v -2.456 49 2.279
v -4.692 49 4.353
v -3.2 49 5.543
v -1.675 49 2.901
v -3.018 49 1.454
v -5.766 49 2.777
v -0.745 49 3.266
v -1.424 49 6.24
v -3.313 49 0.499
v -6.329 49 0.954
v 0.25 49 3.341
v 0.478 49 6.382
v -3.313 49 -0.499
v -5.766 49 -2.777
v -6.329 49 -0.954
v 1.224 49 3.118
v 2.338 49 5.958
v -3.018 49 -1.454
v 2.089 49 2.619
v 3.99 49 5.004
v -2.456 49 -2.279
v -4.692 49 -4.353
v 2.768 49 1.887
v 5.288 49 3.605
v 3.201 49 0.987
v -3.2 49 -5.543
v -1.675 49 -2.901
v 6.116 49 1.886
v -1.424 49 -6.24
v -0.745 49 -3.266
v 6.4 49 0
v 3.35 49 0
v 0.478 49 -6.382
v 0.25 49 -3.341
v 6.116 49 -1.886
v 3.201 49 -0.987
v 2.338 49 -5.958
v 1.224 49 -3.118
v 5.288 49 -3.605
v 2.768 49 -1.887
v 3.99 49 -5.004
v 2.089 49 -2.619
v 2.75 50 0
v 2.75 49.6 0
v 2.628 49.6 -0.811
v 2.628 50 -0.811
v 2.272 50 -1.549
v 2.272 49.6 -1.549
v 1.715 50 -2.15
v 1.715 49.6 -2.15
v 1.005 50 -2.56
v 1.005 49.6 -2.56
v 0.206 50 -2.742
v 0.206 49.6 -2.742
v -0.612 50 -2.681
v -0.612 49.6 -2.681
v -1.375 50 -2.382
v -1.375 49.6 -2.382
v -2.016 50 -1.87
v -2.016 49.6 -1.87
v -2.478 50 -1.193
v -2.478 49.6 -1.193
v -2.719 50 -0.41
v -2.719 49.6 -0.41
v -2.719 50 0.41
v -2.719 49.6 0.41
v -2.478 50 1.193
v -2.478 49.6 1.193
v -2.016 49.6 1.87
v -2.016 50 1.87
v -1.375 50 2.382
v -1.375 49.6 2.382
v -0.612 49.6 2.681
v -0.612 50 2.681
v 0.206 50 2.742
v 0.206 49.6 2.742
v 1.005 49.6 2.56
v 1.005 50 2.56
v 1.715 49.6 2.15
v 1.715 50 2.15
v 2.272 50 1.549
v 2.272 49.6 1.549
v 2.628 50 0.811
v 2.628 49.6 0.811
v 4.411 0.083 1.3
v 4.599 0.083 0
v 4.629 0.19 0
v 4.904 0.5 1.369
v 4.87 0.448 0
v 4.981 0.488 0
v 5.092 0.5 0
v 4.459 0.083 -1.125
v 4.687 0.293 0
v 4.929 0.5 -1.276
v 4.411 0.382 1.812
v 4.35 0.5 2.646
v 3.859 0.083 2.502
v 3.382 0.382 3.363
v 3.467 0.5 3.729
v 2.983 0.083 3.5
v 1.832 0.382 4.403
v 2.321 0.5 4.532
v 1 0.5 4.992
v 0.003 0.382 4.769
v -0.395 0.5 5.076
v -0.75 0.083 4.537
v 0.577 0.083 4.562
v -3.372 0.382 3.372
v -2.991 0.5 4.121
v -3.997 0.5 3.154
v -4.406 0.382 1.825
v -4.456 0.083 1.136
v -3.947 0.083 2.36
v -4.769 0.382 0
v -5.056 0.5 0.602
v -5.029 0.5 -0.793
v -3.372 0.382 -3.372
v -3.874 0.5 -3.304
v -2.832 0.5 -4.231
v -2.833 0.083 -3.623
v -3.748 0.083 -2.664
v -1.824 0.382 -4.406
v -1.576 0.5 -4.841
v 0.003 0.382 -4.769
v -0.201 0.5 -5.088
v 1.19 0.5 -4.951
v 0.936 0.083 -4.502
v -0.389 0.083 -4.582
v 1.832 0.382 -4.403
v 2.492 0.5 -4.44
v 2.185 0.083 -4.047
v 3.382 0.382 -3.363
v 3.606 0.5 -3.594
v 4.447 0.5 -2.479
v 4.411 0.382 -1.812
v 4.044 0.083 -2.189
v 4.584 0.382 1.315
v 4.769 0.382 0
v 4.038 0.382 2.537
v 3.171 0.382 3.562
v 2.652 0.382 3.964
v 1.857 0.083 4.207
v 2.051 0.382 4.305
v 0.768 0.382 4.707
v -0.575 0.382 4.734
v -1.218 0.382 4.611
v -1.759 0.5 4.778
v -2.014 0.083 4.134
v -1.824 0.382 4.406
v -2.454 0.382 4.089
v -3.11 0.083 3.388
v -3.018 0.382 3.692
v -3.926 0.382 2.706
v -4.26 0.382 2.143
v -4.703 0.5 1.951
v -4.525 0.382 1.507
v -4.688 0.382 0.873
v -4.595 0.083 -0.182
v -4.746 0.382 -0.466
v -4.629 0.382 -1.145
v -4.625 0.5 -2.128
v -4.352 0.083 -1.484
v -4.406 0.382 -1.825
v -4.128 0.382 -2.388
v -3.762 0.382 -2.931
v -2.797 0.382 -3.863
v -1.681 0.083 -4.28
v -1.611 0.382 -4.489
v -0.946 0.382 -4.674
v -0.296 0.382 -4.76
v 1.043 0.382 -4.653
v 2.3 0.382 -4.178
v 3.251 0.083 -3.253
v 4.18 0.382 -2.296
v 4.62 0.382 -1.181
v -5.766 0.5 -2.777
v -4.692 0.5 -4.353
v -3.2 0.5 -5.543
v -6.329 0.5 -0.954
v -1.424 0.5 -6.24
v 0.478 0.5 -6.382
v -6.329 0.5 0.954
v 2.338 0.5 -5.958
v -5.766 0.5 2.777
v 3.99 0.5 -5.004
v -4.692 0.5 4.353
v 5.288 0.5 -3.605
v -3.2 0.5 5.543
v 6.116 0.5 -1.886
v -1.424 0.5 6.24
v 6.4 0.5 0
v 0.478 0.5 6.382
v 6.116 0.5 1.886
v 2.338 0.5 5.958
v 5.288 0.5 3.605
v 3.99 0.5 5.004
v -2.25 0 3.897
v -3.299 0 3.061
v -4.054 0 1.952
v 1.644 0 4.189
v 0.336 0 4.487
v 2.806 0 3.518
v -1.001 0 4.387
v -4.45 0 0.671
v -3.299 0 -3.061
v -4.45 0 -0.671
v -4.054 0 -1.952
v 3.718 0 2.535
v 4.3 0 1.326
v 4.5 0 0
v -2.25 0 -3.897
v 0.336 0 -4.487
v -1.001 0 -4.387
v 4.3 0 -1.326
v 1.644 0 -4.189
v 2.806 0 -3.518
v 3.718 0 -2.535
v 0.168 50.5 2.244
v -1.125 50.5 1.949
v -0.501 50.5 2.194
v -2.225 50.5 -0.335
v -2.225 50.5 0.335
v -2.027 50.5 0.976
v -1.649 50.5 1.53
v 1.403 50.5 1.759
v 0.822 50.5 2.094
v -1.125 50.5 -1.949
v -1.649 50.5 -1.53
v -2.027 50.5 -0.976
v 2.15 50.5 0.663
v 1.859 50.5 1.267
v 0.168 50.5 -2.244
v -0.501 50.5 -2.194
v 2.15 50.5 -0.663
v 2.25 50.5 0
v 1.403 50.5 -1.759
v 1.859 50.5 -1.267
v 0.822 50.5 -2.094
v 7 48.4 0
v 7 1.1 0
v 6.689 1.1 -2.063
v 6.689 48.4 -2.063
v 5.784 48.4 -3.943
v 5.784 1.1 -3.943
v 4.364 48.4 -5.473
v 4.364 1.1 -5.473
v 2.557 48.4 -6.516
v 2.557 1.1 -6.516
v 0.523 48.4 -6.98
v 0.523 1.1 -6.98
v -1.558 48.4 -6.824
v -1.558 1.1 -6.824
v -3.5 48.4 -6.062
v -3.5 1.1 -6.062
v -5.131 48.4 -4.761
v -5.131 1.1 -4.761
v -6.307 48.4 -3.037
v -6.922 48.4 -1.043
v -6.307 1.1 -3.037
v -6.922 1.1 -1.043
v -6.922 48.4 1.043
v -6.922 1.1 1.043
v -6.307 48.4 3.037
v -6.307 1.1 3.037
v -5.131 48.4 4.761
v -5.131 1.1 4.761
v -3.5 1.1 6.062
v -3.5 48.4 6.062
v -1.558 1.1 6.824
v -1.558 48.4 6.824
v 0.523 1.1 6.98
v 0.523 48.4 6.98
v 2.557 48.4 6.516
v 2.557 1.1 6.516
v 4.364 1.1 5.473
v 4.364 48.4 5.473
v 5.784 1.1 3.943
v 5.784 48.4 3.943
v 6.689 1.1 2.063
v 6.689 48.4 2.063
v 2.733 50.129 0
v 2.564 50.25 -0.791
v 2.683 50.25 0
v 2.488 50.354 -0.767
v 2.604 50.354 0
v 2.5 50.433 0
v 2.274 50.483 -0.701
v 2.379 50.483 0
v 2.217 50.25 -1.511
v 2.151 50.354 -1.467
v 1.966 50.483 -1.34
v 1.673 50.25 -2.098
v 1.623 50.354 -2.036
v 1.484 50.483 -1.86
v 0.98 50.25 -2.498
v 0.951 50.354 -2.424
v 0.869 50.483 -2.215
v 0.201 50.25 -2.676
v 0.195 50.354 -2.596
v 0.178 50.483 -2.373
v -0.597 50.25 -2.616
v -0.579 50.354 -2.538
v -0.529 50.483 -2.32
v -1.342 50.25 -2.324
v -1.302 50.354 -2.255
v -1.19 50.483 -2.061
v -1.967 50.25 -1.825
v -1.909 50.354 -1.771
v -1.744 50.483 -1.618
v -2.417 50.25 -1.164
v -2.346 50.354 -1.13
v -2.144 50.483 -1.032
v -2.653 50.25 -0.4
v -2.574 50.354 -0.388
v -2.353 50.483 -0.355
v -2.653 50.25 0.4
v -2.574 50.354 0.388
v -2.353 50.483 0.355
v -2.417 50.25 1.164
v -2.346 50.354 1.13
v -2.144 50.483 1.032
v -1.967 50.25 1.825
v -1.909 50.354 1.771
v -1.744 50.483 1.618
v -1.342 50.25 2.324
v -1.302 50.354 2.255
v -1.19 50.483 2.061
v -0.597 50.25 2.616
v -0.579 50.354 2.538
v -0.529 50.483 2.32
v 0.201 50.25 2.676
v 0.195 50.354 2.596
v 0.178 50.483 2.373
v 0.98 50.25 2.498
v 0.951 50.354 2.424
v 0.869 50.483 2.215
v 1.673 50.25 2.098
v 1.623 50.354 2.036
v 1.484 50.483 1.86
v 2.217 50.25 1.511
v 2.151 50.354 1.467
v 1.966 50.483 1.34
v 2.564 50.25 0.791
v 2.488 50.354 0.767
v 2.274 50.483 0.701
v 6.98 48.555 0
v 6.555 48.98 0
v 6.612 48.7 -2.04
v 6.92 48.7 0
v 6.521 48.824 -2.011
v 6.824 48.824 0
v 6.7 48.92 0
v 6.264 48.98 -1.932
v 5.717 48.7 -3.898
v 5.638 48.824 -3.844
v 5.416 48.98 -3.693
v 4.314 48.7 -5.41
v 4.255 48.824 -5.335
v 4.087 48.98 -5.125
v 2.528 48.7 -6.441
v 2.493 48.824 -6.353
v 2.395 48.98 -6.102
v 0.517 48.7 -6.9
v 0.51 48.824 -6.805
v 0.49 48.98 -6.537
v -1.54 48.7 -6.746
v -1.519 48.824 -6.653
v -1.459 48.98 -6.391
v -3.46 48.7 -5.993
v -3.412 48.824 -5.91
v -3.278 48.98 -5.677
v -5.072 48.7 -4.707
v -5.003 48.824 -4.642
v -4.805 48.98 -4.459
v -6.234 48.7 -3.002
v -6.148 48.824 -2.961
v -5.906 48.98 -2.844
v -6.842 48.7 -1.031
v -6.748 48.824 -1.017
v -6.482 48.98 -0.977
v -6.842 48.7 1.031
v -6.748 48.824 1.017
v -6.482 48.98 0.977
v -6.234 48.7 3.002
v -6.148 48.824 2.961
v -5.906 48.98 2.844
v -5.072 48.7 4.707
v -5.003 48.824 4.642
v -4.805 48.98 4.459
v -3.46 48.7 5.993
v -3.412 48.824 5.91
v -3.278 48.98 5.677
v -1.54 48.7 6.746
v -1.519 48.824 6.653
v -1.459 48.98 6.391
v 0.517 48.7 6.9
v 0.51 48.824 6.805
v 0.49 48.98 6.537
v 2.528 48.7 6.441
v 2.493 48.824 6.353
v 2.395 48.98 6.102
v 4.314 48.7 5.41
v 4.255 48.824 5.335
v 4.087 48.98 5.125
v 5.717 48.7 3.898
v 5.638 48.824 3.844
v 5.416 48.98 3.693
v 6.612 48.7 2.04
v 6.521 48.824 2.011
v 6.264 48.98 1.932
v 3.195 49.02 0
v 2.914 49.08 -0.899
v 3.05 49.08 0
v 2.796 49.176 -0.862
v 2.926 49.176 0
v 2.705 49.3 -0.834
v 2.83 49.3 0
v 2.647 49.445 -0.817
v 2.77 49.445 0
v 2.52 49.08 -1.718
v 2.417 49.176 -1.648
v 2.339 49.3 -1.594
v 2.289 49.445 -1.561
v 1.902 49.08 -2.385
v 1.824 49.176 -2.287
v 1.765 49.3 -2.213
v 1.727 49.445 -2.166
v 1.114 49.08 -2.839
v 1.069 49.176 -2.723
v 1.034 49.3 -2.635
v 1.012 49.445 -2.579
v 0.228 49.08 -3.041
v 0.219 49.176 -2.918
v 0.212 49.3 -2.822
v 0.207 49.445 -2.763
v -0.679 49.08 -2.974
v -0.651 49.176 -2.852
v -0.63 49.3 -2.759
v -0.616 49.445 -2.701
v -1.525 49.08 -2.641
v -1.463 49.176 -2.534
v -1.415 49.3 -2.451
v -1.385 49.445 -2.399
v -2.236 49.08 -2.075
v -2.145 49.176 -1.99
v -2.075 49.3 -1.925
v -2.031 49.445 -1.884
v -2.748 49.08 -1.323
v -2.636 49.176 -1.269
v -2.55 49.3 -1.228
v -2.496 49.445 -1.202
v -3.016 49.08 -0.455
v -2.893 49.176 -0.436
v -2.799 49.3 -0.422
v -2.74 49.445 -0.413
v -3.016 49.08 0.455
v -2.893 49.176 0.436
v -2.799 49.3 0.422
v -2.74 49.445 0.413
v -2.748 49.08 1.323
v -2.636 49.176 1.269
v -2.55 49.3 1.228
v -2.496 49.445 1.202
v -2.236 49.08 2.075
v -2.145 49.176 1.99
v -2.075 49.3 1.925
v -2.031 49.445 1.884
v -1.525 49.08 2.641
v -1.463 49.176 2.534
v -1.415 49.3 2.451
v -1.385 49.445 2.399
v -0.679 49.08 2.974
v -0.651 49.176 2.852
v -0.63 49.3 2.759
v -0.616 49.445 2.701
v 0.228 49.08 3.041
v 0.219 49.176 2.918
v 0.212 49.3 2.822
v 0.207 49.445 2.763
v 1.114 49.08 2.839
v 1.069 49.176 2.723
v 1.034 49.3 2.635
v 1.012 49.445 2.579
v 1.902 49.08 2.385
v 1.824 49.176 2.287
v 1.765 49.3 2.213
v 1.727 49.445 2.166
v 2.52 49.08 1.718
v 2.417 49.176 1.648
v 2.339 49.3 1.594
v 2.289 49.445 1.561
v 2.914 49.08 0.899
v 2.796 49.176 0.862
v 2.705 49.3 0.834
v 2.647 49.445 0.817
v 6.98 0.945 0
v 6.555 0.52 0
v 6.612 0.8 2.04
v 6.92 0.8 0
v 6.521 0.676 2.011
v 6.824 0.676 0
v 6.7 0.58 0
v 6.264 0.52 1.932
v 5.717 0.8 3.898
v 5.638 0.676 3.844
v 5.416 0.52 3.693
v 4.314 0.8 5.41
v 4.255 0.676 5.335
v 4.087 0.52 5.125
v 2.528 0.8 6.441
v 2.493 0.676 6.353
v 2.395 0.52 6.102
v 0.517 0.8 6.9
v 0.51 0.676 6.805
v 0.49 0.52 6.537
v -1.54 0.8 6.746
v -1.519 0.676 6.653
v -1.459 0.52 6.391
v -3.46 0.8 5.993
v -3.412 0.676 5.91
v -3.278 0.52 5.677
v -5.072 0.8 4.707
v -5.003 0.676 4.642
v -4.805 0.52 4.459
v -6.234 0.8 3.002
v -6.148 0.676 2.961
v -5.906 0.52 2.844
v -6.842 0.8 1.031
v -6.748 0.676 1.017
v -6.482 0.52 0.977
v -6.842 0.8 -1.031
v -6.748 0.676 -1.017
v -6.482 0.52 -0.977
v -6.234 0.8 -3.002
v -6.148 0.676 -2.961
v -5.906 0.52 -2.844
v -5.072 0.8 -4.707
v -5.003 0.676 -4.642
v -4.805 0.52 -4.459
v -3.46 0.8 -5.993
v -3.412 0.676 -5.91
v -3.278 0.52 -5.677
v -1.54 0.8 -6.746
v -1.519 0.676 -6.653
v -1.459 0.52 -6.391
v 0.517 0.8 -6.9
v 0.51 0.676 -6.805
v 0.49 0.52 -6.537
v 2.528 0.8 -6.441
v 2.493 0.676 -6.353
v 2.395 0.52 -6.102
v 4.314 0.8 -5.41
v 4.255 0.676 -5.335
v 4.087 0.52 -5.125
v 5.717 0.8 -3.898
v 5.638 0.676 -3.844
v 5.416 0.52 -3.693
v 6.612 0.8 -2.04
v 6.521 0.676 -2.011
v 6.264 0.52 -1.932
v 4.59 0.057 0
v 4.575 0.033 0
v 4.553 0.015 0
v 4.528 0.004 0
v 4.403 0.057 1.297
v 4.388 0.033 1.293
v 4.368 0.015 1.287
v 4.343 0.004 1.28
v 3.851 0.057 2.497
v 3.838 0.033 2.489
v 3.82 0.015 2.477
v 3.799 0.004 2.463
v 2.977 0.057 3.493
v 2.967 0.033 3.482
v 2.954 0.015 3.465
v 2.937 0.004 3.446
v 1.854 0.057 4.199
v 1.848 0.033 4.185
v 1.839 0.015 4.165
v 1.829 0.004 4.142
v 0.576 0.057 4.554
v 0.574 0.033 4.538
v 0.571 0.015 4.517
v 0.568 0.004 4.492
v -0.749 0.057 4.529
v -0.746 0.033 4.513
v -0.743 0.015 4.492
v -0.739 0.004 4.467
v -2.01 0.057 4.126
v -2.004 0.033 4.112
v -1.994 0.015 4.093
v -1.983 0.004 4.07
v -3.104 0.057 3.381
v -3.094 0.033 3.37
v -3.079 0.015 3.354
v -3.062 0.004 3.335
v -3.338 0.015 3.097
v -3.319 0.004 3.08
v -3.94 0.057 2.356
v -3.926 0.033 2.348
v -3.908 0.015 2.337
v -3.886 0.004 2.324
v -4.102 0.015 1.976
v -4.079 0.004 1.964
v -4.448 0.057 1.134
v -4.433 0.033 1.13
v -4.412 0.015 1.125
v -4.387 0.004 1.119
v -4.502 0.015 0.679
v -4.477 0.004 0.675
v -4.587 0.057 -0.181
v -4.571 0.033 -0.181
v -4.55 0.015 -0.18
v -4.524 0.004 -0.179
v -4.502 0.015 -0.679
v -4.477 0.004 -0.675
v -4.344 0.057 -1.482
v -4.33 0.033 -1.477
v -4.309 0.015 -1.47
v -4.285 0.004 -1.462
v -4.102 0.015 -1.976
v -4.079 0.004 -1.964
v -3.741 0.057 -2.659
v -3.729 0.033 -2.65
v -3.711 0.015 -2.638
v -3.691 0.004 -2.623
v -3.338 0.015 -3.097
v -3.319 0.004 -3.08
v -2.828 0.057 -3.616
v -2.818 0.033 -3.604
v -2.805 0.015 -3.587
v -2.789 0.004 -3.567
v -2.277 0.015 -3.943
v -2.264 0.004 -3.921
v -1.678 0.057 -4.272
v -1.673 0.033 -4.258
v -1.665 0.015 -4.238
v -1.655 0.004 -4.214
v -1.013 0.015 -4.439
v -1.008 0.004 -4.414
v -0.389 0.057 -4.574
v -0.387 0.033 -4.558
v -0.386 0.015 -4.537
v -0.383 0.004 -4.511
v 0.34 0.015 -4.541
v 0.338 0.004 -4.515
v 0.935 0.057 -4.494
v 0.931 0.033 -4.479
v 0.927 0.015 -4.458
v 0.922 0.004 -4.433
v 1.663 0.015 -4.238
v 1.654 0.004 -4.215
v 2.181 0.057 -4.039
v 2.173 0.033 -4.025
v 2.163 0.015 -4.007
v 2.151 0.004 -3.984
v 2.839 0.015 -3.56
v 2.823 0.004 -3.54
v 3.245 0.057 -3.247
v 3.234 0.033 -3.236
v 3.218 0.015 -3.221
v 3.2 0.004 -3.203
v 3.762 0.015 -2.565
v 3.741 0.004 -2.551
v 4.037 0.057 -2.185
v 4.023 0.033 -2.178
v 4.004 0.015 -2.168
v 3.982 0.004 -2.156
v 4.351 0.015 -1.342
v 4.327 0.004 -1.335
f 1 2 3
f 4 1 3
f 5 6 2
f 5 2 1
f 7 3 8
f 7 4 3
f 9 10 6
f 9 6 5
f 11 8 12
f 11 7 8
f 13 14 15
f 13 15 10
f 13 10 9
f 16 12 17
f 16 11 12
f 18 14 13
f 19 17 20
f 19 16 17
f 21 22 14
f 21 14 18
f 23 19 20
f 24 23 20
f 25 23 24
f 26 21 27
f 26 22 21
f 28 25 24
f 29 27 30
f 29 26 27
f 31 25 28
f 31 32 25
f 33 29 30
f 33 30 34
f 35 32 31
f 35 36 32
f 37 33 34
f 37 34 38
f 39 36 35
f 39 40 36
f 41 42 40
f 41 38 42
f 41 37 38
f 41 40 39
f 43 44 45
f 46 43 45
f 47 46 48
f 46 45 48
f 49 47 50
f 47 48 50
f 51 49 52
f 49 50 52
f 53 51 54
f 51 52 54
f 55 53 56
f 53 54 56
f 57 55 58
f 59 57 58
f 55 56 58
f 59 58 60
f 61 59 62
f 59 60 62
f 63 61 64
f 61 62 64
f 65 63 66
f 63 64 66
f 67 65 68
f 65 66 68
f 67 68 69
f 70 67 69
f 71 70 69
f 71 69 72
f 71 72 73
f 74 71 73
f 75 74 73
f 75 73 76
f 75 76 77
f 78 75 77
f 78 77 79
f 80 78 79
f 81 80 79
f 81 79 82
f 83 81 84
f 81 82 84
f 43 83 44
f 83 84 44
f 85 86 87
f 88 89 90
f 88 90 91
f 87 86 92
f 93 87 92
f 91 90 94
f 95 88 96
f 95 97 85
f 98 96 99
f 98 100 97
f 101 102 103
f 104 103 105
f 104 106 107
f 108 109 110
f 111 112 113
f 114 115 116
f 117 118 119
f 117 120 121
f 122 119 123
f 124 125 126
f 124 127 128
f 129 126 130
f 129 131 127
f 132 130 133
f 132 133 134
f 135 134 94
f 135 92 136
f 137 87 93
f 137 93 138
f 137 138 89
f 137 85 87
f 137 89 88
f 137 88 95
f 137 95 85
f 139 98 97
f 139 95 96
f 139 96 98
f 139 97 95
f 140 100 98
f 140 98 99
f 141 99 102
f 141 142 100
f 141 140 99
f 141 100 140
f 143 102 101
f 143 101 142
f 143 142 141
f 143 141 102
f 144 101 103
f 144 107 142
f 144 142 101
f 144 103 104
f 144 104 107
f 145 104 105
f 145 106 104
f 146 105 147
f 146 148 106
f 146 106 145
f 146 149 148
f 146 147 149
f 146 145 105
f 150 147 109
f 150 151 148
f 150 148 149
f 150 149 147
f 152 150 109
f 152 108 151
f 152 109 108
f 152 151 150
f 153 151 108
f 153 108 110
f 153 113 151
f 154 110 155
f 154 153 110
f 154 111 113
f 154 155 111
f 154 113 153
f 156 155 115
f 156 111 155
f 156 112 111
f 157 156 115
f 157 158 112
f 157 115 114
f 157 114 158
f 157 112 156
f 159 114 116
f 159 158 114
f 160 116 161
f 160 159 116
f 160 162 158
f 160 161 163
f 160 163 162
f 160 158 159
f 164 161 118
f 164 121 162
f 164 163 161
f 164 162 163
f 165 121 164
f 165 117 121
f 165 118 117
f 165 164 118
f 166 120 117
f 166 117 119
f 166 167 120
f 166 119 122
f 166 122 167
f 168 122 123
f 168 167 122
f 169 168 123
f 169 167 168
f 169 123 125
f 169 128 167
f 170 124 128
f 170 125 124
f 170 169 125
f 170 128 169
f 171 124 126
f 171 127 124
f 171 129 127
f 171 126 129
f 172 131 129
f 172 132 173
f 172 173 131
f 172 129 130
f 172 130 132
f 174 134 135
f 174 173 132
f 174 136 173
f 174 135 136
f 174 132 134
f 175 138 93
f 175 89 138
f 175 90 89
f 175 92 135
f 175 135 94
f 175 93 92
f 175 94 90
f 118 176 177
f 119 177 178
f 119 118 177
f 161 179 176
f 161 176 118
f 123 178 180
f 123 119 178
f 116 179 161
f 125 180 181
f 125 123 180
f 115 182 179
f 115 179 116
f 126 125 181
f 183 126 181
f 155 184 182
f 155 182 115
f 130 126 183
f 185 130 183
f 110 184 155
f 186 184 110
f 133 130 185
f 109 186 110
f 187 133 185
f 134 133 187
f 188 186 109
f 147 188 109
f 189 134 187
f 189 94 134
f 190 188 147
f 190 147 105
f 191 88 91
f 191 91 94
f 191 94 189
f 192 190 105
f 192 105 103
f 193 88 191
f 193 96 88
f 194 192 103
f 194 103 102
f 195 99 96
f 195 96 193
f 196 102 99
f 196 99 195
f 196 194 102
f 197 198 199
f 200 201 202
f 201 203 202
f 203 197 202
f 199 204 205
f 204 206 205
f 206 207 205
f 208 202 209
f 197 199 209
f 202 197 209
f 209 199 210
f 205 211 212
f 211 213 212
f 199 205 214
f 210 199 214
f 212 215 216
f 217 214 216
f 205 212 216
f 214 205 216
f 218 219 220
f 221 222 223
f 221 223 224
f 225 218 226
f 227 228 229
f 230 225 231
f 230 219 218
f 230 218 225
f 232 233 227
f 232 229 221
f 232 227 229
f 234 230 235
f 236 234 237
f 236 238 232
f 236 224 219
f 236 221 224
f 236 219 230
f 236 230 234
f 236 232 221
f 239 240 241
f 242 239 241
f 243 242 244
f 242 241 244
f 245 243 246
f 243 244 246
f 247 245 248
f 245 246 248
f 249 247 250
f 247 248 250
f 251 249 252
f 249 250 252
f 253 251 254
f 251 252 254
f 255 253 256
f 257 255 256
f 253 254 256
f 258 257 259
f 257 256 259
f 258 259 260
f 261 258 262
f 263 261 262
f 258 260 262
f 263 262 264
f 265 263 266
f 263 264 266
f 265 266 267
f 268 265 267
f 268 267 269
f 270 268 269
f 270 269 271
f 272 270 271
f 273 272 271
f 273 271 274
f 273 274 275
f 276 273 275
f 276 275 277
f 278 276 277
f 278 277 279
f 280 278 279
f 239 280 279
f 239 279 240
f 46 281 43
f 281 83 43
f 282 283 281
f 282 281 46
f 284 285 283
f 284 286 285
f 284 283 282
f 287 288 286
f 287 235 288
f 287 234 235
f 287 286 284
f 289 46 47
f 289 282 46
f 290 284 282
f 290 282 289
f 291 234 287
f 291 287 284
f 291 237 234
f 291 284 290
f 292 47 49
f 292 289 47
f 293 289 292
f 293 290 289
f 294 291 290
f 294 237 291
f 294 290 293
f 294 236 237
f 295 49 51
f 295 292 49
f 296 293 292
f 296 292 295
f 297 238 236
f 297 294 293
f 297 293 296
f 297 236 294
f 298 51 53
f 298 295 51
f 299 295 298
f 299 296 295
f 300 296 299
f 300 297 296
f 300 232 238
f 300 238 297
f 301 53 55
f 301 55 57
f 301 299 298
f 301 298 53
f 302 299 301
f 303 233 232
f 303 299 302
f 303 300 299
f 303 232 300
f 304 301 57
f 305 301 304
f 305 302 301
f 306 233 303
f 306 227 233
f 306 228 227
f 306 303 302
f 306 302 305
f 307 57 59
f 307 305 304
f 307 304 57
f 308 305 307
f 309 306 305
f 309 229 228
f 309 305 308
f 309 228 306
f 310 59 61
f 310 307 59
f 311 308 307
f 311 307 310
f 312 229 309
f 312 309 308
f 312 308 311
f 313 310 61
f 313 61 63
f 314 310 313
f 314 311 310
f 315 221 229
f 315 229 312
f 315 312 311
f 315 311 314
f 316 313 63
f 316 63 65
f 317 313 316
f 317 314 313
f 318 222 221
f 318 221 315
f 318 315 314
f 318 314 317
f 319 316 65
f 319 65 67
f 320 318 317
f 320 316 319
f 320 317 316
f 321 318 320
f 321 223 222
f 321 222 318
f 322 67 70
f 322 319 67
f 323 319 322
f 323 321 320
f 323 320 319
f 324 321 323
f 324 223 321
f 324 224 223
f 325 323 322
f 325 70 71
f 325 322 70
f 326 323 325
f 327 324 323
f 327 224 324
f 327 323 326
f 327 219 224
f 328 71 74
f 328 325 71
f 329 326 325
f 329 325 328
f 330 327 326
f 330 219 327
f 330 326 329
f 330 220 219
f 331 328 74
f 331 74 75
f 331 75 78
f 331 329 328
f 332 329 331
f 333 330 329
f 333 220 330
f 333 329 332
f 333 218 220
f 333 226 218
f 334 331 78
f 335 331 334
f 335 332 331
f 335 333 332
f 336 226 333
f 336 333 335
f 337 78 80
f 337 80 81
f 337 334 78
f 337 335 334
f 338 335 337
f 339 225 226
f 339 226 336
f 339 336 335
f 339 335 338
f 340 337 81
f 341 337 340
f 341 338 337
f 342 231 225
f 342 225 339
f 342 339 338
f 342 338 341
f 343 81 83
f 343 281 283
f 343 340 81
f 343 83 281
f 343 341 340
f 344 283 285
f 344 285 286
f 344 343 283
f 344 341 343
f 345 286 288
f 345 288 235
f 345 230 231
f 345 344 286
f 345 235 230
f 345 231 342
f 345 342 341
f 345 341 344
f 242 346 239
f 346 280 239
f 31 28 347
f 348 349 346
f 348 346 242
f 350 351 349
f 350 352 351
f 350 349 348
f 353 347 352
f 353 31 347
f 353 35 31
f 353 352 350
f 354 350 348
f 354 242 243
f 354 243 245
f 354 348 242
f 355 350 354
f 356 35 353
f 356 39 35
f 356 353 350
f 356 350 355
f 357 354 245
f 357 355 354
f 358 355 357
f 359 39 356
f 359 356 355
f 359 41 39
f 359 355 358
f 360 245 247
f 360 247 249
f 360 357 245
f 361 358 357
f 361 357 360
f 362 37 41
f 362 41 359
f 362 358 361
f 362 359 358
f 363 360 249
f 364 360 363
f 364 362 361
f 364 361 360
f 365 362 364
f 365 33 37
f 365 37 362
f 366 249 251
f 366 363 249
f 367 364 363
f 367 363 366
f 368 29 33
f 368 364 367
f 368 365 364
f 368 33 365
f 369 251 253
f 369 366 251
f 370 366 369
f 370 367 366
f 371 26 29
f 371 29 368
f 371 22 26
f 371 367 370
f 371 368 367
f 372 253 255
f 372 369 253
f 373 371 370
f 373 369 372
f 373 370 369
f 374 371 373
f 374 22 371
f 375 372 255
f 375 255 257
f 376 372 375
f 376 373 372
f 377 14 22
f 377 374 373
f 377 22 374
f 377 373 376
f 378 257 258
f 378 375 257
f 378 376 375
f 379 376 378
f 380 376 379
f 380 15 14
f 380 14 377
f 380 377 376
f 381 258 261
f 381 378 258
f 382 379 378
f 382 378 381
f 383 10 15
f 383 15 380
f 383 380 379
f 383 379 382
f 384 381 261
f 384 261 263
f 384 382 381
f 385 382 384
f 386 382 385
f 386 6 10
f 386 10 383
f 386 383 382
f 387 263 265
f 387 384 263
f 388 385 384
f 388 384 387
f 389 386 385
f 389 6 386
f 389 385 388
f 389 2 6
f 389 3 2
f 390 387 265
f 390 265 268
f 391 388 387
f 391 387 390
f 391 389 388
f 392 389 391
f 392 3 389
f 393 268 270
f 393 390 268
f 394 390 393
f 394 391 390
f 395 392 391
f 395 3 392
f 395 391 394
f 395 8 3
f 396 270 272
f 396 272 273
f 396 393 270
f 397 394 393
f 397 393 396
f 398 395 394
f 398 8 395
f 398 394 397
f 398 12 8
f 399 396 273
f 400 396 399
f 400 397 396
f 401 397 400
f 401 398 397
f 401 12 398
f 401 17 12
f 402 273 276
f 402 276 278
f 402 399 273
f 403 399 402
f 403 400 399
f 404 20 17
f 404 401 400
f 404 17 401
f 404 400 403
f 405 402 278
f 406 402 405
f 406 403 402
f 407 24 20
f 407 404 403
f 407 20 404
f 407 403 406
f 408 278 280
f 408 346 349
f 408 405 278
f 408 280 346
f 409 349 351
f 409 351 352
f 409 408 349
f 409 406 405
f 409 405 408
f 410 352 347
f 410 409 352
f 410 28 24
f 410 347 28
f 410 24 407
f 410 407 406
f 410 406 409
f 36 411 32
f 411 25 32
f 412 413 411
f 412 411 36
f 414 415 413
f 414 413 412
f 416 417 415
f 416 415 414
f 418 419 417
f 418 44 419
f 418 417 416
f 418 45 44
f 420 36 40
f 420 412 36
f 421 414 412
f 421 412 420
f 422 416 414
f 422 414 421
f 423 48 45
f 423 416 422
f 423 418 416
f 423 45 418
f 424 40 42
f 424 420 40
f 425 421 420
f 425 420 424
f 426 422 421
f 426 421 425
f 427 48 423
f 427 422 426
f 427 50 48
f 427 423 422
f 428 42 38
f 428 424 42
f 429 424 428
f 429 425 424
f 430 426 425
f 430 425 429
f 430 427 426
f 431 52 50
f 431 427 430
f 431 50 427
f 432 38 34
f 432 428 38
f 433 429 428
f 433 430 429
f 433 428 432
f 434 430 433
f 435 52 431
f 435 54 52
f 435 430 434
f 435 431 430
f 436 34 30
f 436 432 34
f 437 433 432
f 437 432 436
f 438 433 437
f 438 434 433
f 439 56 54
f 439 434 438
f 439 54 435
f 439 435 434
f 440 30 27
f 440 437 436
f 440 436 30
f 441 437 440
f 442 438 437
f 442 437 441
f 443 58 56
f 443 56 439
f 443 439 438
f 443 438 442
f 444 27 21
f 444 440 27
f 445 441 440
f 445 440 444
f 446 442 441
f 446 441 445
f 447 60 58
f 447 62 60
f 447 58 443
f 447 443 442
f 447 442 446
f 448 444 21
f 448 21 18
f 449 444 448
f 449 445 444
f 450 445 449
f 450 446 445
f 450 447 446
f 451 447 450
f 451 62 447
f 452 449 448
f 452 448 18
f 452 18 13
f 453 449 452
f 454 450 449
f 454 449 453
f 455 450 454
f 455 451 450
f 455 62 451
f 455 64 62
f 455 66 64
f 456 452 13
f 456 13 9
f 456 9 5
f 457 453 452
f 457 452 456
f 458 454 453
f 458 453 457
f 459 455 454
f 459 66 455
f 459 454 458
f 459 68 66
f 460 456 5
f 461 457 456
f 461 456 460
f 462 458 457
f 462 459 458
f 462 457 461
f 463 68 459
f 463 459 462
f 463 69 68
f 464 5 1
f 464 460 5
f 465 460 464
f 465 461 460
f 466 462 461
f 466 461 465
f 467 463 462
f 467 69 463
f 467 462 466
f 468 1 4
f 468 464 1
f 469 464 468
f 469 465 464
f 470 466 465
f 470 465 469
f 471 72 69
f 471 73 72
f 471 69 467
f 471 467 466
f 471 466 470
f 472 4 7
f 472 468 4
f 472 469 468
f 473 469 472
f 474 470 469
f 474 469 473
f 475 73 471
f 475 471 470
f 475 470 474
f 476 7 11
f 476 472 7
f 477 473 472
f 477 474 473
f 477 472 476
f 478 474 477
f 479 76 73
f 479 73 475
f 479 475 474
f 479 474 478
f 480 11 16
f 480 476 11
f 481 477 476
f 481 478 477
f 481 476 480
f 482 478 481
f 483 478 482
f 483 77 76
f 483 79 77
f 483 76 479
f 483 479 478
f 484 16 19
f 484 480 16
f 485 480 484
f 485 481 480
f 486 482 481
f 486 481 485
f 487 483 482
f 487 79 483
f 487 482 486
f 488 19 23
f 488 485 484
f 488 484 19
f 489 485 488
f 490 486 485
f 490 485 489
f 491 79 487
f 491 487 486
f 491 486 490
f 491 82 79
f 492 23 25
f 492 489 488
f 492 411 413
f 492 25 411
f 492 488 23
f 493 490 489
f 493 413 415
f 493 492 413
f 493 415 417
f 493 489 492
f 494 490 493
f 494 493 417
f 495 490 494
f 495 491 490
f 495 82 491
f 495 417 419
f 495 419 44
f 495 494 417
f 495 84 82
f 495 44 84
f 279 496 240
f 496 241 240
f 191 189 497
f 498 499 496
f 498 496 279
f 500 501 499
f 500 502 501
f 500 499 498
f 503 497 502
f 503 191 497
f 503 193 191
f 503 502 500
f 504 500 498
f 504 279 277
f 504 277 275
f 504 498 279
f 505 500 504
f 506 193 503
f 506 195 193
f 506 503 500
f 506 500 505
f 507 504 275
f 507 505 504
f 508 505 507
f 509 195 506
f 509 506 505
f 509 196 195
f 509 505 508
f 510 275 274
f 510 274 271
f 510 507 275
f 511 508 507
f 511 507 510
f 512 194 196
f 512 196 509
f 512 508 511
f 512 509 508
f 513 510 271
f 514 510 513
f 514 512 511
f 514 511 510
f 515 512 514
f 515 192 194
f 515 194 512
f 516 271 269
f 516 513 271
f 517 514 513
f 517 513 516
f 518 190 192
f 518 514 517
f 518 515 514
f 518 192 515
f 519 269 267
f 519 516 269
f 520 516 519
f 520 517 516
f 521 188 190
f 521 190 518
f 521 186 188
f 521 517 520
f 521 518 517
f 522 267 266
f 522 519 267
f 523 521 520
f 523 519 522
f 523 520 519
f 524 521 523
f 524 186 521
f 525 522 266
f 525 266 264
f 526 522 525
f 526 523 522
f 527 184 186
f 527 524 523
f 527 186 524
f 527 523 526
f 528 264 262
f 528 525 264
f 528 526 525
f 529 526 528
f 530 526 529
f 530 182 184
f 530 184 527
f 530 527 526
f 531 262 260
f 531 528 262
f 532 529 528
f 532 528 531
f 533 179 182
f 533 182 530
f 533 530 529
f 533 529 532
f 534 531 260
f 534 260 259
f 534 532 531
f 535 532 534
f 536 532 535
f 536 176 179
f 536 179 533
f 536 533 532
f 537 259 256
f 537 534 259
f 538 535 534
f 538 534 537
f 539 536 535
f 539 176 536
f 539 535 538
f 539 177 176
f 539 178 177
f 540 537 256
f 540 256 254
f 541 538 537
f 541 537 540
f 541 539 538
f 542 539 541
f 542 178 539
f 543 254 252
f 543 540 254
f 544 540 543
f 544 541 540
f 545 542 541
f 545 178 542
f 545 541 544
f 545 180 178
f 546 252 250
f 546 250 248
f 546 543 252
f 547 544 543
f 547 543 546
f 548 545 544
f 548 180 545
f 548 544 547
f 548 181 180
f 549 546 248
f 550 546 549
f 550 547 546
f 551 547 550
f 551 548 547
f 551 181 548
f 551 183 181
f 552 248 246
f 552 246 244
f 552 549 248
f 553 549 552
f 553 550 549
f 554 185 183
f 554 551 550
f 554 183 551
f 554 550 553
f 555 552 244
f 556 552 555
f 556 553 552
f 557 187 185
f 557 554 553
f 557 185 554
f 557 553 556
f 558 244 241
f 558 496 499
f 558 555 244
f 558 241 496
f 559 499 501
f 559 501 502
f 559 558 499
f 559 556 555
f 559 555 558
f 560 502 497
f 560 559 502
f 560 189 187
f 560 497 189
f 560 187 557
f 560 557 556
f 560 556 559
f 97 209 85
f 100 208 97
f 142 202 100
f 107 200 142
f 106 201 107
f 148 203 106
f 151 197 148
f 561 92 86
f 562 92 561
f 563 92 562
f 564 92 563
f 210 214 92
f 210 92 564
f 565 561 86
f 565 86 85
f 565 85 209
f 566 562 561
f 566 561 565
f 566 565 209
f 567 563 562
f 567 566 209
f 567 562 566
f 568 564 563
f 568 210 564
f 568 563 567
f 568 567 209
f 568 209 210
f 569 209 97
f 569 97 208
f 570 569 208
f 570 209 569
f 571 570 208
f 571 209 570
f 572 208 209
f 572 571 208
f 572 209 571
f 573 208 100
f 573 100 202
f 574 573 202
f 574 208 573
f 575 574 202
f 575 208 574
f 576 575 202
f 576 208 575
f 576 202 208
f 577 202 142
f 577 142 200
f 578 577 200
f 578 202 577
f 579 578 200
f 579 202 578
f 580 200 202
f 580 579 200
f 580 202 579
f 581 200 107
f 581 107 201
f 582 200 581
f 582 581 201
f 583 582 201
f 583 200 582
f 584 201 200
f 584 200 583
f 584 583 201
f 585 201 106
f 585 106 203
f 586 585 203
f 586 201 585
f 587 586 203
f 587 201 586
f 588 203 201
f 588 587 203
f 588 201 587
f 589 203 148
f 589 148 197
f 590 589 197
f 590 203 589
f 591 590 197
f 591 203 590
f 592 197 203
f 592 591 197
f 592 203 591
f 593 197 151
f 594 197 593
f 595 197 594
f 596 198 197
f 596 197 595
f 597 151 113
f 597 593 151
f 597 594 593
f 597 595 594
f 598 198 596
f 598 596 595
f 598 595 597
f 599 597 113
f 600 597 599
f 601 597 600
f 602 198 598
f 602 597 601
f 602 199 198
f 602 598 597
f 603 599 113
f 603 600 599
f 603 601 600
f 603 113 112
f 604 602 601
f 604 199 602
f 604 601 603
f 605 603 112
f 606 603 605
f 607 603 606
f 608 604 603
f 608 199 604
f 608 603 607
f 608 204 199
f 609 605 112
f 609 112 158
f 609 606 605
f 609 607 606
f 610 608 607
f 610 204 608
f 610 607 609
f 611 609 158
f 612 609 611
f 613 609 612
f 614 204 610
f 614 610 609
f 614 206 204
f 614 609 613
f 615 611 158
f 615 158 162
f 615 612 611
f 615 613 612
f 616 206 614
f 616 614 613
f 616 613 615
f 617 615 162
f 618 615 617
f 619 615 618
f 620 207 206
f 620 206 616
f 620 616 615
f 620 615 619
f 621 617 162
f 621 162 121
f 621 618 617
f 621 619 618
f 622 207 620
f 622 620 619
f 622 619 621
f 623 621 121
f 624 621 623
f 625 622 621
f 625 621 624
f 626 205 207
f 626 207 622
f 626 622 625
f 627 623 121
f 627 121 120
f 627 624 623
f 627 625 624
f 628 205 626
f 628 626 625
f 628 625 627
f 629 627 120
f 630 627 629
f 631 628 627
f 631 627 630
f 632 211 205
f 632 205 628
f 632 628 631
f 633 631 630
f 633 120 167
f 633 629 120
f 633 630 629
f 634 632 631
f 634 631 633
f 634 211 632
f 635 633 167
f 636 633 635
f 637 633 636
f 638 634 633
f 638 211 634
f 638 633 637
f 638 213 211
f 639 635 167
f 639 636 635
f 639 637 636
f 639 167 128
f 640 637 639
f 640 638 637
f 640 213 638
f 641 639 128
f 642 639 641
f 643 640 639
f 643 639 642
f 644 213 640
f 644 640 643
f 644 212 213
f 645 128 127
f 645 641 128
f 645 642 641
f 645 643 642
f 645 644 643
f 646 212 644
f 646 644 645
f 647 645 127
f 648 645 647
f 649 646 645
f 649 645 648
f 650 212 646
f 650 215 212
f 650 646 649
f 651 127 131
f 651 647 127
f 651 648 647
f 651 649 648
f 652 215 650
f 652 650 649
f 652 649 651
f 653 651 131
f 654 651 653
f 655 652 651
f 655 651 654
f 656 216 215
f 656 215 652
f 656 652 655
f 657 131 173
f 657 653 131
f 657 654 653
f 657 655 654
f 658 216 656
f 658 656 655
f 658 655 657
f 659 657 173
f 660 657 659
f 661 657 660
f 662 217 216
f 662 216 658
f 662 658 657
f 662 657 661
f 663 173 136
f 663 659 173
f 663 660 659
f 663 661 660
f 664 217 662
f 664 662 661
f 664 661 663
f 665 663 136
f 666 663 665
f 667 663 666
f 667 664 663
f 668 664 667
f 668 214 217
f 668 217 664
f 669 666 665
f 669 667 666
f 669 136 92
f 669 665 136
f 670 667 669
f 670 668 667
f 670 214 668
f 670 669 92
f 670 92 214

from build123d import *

# Parameters (mm, degrees)
SKETCH1_R           = 7
BOSS_EXTRUDE1_DEPTH = 49
SKETCH2_R           = 2.75
BOSS_EXTRUDE2_DEPTH = 1.5
FILLET2_R           = 0.6
FILLET3_R           = 0.5
SKETCH4_R           = 7
SKETCH4_R_2         = 4.6
CUT_EXTRUDE2_DEPTH  = 0.5
FILLET7_R           = 0.6
FILLET8_R           = 0.6
FILLET9_R           = 0.1
FILLET10_R          = 0.5


with BuildPart() as part:
    # Sketch1 → Boss-Extrude1 (new body)
    with BuildSketch(Plane(origin=(0, 0, 0), x_dir=(1, 0, 0), z_dir=(0, 1, 0))):
        Circle(SKETCH1_R)
    extrude(amount=BOSS_EXTRUDE1_DEPTH)

    # Sketch2 → Boss-Extrude2 (add)
    with BuildSketch(Plane(origin=(0, 49, 0), x_dir=(1, 0, 0), z_dir=(0, 1, 0))):
        Circle(SKETCH2_R)
    extrude(amount=BOSS_EXTRUDE2_DEPTH)

    # Fillet2
    fillet2_edges = [part.edges().sort_by_distance(p)[0] for p in [
        (-2.75, 49, 0),
    ]]
    fillet(fillet2_edges, radius=FILLET2_R)

    # Fillet3
    fillet3_edges = [part.edges().sort_by_distance(p)[0] for p in [
        (-2.75, 50.5, 0),
    ]]
    fillet(fillet3_edges, radius=FILLET3_R)

    # Sketch4 → Cut-Extrude2 (cut)
    with BuildSketch(Plane.XZ):
        Circle(SKETCH4_R)
        Circle(SKETCH4_R_2, mode=Mode.SUBTRACT)
    extrude(amount=-CUT_EXTRUDE2_DEPTH, mode=Mode.SUBTRACT)

    # Fillet7
    fillet7_edges = [part.edges().sort_by_distance(p)[0] for p in [
        (-7, 0.5, 0),
    ]]
    fillet(fillet7_edges, radius=FILLET7_R)

    # Fillet8
    fillet8_edges = [part.edges().sort_by_distance(p)[0] for p in [
        (-7, 49, 0),
    ]]
    fillet(fillet8_edges, radius=FILLET8_R)

    # Fillet9
    fillet9_edges = [part.edges().sort_by_distance(p)[0] for p in [
        (-4.6, 0, 0),
    ]]
    fillet(fillet9_edges, radius=FILLET9_R)

    # Fillet10
    fillet10_edges = [part.edges().sort_by_distance(p)[0] for p in [
        (-4.6, 0.5, 0),
    ]]
    fillet(fillet10_edges, radius=FILLET10_R)


solid = part.part
